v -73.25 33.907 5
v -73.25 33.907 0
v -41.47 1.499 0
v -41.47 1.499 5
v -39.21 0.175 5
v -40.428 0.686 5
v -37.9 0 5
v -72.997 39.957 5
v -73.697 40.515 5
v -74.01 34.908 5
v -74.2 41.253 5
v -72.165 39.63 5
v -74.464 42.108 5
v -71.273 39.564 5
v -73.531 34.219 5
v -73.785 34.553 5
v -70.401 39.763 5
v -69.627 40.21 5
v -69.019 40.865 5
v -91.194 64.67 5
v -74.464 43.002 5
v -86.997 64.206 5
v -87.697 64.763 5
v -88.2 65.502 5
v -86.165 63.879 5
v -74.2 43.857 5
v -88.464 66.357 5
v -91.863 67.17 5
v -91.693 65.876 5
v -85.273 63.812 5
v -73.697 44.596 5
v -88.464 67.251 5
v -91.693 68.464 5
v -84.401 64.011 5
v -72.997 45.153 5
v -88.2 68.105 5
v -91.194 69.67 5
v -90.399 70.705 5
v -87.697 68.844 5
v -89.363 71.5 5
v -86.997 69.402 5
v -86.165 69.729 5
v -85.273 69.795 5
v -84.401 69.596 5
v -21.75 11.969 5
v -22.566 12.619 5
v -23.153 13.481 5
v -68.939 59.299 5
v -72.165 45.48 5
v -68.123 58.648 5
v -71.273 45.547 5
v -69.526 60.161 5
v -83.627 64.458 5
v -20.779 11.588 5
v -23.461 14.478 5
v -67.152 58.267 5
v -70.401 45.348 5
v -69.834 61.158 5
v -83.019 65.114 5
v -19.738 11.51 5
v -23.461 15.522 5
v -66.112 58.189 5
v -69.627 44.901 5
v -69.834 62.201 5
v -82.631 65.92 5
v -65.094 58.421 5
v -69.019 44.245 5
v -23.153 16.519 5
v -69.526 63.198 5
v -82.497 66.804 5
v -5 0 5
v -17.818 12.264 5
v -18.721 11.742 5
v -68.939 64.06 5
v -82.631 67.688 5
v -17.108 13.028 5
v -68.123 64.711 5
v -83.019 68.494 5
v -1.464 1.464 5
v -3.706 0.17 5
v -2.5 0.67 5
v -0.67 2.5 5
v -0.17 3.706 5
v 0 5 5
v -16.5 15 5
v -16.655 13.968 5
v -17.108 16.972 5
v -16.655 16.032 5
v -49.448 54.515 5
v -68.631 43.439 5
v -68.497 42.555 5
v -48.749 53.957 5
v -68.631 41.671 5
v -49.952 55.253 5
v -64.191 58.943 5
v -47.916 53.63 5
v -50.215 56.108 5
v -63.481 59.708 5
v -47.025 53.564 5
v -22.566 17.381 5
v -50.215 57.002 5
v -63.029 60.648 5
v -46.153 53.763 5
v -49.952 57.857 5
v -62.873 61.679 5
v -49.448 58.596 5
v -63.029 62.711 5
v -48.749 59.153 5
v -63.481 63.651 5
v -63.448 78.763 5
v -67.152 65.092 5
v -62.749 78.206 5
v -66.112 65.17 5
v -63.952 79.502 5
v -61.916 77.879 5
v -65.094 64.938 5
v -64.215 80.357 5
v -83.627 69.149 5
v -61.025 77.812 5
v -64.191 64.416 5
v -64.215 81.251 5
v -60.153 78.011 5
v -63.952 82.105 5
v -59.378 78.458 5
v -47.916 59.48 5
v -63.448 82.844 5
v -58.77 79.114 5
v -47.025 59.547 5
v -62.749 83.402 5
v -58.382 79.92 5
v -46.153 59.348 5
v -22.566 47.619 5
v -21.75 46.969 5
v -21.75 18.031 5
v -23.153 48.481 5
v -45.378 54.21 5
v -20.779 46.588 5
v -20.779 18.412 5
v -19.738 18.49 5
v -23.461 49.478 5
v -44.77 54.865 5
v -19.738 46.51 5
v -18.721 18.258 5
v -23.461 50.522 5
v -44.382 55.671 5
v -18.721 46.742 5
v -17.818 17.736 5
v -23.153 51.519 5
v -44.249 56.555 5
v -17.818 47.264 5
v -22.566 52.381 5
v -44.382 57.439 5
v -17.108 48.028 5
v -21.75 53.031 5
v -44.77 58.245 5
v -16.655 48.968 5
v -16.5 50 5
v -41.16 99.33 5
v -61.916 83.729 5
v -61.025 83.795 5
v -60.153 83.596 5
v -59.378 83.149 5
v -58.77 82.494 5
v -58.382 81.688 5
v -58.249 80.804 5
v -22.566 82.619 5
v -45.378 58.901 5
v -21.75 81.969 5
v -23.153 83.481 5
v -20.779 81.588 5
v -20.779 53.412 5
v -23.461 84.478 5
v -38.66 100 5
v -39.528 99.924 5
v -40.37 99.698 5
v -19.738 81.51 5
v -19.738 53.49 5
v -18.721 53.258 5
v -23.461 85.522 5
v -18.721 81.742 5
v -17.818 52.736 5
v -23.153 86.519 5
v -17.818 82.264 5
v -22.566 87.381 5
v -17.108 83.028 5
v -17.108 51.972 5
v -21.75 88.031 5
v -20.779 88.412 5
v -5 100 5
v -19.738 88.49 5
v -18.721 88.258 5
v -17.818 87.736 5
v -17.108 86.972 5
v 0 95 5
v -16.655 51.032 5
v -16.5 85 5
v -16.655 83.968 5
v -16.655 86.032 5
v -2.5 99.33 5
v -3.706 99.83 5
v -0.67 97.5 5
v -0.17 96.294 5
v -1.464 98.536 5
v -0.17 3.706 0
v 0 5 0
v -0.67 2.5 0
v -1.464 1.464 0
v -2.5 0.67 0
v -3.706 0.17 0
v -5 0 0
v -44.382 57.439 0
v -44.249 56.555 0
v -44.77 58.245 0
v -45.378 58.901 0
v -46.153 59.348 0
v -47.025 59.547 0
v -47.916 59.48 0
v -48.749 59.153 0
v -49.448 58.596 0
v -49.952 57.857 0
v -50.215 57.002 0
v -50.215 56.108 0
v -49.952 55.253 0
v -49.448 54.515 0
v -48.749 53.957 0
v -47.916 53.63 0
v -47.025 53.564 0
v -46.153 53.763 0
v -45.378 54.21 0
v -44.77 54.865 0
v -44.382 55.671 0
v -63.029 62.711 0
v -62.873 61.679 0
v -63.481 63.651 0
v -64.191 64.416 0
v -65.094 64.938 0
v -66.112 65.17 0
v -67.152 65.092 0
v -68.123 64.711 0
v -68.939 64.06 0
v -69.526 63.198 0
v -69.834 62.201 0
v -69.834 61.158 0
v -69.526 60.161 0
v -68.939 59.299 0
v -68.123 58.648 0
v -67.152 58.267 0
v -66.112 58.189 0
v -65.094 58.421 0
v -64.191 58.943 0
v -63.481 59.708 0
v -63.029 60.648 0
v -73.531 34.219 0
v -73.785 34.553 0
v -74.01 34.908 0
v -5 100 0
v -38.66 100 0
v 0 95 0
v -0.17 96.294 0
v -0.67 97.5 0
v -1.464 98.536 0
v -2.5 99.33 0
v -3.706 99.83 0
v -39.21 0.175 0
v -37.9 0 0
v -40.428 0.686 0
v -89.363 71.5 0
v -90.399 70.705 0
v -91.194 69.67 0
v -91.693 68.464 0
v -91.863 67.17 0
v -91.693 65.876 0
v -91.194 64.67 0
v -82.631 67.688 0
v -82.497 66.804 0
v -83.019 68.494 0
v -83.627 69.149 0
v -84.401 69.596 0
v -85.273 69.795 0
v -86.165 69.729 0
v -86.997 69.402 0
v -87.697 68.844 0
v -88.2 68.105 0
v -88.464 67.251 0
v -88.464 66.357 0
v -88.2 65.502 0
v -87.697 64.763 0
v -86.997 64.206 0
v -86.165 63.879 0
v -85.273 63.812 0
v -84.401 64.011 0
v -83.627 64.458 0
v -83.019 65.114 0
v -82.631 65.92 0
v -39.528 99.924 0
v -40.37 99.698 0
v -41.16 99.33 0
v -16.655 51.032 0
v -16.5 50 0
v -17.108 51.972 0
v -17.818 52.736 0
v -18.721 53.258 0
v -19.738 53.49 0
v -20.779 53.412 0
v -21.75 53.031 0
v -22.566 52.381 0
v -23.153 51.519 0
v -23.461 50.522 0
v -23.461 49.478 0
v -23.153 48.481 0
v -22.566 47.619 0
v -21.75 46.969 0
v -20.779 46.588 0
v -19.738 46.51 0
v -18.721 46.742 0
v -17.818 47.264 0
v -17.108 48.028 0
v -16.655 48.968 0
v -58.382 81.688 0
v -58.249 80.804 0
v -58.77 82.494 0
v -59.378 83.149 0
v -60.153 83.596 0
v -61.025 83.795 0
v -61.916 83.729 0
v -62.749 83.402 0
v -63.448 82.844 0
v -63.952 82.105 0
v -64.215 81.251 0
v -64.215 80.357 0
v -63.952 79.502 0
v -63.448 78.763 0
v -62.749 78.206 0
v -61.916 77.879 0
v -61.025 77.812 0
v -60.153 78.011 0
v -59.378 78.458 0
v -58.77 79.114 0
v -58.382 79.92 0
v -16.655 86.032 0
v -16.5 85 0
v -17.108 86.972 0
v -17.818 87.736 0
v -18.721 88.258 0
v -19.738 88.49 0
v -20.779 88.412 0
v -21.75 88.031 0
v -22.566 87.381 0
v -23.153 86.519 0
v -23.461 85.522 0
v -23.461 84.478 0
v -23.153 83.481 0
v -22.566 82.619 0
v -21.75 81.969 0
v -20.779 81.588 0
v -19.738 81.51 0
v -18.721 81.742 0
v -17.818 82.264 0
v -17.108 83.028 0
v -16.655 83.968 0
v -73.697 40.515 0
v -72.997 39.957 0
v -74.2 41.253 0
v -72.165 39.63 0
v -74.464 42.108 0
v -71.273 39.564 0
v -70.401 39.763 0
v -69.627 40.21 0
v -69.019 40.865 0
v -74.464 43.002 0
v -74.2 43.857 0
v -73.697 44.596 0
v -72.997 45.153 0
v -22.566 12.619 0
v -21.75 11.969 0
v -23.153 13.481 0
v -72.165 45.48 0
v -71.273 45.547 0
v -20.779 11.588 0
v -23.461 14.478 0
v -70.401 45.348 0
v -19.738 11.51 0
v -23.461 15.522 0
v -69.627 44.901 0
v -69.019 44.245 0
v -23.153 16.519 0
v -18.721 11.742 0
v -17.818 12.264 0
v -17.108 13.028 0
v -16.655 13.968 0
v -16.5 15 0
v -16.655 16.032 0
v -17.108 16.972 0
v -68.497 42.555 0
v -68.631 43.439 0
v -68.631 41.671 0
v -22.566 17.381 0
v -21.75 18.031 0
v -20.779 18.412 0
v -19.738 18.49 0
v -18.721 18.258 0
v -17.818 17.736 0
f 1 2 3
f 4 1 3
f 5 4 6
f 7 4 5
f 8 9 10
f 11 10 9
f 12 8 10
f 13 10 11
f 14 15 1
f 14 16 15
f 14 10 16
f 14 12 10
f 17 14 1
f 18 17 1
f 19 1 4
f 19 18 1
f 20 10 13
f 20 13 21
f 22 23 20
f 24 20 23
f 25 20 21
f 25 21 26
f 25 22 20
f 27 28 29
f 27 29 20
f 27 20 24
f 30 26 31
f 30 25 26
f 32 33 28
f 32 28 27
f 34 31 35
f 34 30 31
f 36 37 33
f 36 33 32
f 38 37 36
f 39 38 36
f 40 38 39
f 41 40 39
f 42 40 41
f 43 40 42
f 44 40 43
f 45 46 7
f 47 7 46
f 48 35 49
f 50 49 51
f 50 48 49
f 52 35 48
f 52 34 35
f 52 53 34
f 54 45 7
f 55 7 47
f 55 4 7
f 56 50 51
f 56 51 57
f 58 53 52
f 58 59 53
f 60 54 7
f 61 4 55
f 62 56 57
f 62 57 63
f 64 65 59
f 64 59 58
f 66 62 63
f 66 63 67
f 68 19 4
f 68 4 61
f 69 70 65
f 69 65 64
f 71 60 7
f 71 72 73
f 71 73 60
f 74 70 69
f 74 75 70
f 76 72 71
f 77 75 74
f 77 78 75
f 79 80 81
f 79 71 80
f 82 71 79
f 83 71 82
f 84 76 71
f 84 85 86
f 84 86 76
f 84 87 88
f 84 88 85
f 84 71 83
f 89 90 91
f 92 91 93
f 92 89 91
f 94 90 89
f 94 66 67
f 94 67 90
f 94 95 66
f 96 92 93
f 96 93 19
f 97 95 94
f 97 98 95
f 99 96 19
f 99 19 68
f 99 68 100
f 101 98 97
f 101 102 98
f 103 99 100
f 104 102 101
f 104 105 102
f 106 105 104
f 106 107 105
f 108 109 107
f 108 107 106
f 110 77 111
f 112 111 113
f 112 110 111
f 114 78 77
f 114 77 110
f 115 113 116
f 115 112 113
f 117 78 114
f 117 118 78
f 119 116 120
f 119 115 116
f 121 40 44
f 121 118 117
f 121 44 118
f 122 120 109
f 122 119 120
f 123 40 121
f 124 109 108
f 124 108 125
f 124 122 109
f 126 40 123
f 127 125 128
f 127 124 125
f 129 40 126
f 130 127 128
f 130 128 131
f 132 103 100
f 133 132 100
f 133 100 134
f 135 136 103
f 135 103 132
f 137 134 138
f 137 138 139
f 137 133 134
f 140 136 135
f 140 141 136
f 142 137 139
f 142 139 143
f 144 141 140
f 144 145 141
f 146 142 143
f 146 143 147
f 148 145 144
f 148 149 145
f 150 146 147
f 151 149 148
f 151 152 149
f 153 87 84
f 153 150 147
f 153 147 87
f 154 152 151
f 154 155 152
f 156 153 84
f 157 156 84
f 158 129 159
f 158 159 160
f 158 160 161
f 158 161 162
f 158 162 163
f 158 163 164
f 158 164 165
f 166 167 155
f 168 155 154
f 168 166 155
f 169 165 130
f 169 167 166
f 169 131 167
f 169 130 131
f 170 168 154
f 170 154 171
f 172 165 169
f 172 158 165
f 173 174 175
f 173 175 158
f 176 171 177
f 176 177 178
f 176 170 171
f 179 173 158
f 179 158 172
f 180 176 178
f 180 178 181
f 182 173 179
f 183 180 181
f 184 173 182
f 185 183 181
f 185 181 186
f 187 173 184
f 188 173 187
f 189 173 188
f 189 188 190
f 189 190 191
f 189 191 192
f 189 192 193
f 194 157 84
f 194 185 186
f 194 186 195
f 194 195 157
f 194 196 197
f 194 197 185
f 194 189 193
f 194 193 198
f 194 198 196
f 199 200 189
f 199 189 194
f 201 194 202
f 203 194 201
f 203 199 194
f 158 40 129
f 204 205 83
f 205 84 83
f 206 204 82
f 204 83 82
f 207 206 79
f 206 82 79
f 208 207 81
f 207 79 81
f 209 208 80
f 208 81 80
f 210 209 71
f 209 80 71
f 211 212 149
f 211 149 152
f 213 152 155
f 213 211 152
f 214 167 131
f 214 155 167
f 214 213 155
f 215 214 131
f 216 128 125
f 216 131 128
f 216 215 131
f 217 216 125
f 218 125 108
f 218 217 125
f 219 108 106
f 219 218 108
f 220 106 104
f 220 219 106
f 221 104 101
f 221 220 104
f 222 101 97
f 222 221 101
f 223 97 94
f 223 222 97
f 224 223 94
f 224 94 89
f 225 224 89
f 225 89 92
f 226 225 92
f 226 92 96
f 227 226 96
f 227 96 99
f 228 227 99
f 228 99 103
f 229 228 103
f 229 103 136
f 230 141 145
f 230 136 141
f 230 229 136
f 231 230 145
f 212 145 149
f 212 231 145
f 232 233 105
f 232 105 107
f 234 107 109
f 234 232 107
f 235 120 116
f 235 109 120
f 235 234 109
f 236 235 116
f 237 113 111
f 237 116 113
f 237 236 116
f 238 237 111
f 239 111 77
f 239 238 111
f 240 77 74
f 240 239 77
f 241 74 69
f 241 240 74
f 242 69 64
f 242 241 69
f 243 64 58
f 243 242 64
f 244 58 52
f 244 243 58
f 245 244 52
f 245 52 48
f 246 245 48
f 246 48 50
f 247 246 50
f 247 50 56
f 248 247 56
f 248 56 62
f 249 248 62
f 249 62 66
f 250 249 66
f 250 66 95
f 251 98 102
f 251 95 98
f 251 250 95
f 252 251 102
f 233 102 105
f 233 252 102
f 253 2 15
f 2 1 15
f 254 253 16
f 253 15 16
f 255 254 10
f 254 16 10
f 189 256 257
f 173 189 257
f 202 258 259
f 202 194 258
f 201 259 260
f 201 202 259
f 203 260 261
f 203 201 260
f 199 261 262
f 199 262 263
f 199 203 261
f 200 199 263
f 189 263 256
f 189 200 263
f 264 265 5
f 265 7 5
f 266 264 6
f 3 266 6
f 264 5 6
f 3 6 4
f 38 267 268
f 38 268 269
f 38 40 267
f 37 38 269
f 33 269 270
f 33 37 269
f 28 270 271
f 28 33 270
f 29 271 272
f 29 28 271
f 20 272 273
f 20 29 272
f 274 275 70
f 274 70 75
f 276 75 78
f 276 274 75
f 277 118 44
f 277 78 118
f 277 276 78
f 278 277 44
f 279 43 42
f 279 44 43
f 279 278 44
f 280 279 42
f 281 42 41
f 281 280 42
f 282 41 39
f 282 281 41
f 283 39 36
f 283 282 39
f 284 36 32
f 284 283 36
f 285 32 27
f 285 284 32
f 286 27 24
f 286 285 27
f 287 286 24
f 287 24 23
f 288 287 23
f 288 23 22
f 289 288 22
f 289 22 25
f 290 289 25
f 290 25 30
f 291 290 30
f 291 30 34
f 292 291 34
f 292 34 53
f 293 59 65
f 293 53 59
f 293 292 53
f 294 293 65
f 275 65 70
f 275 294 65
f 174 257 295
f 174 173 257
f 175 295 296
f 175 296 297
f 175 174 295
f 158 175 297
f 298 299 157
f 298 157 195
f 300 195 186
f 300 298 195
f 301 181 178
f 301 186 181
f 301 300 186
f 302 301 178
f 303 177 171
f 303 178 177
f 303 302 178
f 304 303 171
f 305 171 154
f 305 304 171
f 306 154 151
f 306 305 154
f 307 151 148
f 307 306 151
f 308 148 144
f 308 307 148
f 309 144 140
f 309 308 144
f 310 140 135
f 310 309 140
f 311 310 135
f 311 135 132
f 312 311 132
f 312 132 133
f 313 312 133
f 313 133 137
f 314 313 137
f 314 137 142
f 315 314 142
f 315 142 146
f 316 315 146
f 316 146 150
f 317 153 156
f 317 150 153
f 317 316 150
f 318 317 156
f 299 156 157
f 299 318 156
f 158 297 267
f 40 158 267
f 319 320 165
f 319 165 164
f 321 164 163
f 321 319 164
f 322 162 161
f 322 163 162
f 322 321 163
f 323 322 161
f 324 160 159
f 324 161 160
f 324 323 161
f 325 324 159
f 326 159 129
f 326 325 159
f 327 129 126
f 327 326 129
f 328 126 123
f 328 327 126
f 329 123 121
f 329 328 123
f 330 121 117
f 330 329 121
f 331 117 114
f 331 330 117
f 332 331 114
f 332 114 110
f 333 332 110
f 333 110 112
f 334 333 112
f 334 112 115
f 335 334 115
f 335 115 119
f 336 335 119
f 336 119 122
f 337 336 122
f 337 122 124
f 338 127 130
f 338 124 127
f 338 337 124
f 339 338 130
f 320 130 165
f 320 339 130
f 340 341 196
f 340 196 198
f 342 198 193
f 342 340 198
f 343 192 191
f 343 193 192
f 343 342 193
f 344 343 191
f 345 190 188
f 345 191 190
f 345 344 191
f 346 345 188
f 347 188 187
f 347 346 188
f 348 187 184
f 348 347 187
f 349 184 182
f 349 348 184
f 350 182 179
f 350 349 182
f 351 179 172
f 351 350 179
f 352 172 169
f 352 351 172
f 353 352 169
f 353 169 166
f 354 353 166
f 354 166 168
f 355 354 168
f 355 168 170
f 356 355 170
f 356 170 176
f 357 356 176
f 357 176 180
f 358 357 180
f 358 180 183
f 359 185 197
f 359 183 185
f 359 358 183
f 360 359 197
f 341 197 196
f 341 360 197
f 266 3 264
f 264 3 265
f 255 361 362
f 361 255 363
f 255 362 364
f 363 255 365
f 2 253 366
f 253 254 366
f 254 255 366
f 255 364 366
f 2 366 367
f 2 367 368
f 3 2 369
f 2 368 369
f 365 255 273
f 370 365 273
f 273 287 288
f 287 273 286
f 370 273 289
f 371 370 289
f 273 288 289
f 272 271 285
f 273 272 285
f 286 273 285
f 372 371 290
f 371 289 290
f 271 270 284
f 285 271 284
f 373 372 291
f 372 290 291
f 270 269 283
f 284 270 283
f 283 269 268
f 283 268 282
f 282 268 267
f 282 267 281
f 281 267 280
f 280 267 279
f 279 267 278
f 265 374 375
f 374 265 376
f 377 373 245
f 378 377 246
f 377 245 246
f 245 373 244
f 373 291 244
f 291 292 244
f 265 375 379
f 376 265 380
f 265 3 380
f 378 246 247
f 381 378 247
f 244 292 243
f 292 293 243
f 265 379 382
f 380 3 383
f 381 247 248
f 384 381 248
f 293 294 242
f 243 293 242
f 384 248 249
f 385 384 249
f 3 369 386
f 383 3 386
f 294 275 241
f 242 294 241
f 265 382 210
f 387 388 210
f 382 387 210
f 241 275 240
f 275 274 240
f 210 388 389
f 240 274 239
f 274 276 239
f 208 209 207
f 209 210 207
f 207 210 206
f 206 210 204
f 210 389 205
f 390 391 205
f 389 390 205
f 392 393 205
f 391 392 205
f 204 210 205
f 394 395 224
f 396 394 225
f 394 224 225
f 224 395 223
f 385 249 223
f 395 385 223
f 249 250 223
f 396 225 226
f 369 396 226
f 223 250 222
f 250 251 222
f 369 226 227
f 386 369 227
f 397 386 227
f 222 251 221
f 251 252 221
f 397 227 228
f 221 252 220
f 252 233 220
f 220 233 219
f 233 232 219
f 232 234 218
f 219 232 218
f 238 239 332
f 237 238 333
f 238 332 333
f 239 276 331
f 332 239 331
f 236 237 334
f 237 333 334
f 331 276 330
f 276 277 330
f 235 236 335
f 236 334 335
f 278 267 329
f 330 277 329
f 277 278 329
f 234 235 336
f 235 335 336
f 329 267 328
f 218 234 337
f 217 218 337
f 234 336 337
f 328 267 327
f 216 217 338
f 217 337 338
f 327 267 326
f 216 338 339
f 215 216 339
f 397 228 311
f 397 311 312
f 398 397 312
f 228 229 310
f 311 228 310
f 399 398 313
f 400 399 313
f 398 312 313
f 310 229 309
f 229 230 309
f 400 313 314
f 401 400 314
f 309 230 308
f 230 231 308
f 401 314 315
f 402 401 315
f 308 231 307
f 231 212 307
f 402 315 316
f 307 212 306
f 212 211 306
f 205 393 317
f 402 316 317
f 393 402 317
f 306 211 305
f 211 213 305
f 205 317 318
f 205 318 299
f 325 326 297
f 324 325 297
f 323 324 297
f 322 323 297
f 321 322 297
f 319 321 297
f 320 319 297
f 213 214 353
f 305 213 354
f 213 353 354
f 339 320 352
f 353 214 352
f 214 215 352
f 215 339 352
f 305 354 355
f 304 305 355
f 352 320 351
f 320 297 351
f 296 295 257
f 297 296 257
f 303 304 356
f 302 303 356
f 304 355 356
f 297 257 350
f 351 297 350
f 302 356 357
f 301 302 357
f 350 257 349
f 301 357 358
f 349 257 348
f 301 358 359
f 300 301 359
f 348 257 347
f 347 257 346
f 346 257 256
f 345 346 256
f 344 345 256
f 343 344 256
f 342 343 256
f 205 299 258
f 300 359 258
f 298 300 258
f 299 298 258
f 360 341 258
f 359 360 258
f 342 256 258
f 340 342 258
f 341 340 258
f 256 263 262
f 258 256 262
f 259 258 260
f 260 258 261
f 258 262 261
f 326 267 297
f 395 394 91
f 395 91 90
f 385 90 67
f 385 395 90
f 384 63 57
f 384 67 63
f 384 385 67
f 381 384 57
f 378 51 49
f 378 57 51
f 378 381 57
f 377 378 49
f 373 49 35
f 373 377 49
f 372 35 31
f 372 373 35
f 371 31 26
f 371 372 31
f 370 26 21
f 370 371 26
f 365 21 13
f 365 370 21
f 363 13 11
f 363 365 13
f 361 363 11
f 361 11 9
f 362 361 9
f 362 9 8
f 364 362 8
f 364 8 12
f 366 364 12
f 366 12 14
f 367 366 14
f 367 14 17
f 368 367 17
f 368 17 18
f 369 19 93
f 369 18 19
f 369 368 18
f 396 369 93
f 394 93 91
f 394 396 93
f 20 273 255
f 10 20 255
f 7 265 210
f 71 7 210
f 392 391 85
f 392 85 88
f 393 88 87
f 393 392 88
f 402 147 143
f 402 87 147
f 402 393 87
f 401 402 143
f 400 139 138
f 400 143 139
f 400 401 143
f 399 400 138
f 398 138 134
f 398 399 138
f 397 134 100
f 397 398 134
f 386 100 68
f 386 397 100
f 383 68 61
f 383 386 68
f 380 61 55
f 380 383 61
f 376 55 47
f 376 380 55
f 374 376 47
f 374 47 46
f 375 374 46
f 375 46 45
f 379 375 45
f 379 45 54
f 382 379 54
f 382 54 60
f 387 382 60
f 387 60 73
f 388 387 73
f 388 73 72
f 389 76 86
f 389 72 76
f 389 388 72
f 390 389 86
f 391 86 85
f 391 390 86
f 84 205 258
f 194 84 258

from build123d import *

# Parameters (mm, degrees)
BOSS_EXTRU_1_DEPTH           = 5
ENL_V_MAT_EXTRU_1_DEPTH      = 138.125803563
ENL_V_MAT_EXTRU_1_DEPTH_BACK = 138.125803563
ESQUISSE2_R                  = 3.5
ESQUISSE2_R_2                = 3
CONG_1_R                     = 5


with BuildPart() as part:
    # Esquisse1 → Boss.-Extru.1 (new body)
    with BuildSketch(Plane.XY):
        Polygon((0, 0), (0, 100), (-40, 100), (-93.693575035, 69), (-73.693575035, 34.358983849), (-40, 0), align=None)
    extrude(amount=BOSS_EXTRU_1_DEPTH)

    # Esquisse2 → Enlèv. mat.-Extru.1 (cut, two sides: drawn at the far end of the back side and taken through both)
    with BuildSketch(Plane.XY.offset(5).offset(-ENL_V_MAT_EXTRU_1_DEPTH_BACK)):
        with Locations((-20, 15)):
            Circle(ESQUISSE2_R)
        with Locations((-20, 50)):
            Circle(ESQUISSE2_R)
        with Locations((-20, 85)):
            Circle(ESQUISSE2_R)
        with Locations((-66.373066959, 61.679491924)):
            Circle(ESQUISSE2_R)
        with Locations((-85.497422612, 66.803847577)):
            Circle(ESQUISSE2_R_2)
        with Locations((-61.248711306, 80.803847577)):
            Circle(ESQUISSE2_R_2)
        with Locations((-47.248711306, 56.555136271)):
            Circle(ESQUISSE2_R_2)
        with Locations((-71.497422612, 42.555136271)):
            Circle(ESQUISSE2_R_2)
    extrude(amount=ENL_V_MAT_EXTRU_1_DEPTH + ENL_V_MAT_EXTRU_1_DEPTH_BACK, mode=Mode.SUBTRACT)

    # Congé1
    cong_1_edges = [part.edges().sort_by_distance(p)[0] for p in [
        (-40, 0, 2.5),
        (-73.693575035, 34.358983849, 2.5),
        (-93.693575035, 69, 2.5),
        (-40, 100, 2.5),
        (0, 100, 2.5),
        (0, 0, 2.5),
    ]]
    fillet(cong_1_edges, radius=CONG_1_R)


solid = part.part
